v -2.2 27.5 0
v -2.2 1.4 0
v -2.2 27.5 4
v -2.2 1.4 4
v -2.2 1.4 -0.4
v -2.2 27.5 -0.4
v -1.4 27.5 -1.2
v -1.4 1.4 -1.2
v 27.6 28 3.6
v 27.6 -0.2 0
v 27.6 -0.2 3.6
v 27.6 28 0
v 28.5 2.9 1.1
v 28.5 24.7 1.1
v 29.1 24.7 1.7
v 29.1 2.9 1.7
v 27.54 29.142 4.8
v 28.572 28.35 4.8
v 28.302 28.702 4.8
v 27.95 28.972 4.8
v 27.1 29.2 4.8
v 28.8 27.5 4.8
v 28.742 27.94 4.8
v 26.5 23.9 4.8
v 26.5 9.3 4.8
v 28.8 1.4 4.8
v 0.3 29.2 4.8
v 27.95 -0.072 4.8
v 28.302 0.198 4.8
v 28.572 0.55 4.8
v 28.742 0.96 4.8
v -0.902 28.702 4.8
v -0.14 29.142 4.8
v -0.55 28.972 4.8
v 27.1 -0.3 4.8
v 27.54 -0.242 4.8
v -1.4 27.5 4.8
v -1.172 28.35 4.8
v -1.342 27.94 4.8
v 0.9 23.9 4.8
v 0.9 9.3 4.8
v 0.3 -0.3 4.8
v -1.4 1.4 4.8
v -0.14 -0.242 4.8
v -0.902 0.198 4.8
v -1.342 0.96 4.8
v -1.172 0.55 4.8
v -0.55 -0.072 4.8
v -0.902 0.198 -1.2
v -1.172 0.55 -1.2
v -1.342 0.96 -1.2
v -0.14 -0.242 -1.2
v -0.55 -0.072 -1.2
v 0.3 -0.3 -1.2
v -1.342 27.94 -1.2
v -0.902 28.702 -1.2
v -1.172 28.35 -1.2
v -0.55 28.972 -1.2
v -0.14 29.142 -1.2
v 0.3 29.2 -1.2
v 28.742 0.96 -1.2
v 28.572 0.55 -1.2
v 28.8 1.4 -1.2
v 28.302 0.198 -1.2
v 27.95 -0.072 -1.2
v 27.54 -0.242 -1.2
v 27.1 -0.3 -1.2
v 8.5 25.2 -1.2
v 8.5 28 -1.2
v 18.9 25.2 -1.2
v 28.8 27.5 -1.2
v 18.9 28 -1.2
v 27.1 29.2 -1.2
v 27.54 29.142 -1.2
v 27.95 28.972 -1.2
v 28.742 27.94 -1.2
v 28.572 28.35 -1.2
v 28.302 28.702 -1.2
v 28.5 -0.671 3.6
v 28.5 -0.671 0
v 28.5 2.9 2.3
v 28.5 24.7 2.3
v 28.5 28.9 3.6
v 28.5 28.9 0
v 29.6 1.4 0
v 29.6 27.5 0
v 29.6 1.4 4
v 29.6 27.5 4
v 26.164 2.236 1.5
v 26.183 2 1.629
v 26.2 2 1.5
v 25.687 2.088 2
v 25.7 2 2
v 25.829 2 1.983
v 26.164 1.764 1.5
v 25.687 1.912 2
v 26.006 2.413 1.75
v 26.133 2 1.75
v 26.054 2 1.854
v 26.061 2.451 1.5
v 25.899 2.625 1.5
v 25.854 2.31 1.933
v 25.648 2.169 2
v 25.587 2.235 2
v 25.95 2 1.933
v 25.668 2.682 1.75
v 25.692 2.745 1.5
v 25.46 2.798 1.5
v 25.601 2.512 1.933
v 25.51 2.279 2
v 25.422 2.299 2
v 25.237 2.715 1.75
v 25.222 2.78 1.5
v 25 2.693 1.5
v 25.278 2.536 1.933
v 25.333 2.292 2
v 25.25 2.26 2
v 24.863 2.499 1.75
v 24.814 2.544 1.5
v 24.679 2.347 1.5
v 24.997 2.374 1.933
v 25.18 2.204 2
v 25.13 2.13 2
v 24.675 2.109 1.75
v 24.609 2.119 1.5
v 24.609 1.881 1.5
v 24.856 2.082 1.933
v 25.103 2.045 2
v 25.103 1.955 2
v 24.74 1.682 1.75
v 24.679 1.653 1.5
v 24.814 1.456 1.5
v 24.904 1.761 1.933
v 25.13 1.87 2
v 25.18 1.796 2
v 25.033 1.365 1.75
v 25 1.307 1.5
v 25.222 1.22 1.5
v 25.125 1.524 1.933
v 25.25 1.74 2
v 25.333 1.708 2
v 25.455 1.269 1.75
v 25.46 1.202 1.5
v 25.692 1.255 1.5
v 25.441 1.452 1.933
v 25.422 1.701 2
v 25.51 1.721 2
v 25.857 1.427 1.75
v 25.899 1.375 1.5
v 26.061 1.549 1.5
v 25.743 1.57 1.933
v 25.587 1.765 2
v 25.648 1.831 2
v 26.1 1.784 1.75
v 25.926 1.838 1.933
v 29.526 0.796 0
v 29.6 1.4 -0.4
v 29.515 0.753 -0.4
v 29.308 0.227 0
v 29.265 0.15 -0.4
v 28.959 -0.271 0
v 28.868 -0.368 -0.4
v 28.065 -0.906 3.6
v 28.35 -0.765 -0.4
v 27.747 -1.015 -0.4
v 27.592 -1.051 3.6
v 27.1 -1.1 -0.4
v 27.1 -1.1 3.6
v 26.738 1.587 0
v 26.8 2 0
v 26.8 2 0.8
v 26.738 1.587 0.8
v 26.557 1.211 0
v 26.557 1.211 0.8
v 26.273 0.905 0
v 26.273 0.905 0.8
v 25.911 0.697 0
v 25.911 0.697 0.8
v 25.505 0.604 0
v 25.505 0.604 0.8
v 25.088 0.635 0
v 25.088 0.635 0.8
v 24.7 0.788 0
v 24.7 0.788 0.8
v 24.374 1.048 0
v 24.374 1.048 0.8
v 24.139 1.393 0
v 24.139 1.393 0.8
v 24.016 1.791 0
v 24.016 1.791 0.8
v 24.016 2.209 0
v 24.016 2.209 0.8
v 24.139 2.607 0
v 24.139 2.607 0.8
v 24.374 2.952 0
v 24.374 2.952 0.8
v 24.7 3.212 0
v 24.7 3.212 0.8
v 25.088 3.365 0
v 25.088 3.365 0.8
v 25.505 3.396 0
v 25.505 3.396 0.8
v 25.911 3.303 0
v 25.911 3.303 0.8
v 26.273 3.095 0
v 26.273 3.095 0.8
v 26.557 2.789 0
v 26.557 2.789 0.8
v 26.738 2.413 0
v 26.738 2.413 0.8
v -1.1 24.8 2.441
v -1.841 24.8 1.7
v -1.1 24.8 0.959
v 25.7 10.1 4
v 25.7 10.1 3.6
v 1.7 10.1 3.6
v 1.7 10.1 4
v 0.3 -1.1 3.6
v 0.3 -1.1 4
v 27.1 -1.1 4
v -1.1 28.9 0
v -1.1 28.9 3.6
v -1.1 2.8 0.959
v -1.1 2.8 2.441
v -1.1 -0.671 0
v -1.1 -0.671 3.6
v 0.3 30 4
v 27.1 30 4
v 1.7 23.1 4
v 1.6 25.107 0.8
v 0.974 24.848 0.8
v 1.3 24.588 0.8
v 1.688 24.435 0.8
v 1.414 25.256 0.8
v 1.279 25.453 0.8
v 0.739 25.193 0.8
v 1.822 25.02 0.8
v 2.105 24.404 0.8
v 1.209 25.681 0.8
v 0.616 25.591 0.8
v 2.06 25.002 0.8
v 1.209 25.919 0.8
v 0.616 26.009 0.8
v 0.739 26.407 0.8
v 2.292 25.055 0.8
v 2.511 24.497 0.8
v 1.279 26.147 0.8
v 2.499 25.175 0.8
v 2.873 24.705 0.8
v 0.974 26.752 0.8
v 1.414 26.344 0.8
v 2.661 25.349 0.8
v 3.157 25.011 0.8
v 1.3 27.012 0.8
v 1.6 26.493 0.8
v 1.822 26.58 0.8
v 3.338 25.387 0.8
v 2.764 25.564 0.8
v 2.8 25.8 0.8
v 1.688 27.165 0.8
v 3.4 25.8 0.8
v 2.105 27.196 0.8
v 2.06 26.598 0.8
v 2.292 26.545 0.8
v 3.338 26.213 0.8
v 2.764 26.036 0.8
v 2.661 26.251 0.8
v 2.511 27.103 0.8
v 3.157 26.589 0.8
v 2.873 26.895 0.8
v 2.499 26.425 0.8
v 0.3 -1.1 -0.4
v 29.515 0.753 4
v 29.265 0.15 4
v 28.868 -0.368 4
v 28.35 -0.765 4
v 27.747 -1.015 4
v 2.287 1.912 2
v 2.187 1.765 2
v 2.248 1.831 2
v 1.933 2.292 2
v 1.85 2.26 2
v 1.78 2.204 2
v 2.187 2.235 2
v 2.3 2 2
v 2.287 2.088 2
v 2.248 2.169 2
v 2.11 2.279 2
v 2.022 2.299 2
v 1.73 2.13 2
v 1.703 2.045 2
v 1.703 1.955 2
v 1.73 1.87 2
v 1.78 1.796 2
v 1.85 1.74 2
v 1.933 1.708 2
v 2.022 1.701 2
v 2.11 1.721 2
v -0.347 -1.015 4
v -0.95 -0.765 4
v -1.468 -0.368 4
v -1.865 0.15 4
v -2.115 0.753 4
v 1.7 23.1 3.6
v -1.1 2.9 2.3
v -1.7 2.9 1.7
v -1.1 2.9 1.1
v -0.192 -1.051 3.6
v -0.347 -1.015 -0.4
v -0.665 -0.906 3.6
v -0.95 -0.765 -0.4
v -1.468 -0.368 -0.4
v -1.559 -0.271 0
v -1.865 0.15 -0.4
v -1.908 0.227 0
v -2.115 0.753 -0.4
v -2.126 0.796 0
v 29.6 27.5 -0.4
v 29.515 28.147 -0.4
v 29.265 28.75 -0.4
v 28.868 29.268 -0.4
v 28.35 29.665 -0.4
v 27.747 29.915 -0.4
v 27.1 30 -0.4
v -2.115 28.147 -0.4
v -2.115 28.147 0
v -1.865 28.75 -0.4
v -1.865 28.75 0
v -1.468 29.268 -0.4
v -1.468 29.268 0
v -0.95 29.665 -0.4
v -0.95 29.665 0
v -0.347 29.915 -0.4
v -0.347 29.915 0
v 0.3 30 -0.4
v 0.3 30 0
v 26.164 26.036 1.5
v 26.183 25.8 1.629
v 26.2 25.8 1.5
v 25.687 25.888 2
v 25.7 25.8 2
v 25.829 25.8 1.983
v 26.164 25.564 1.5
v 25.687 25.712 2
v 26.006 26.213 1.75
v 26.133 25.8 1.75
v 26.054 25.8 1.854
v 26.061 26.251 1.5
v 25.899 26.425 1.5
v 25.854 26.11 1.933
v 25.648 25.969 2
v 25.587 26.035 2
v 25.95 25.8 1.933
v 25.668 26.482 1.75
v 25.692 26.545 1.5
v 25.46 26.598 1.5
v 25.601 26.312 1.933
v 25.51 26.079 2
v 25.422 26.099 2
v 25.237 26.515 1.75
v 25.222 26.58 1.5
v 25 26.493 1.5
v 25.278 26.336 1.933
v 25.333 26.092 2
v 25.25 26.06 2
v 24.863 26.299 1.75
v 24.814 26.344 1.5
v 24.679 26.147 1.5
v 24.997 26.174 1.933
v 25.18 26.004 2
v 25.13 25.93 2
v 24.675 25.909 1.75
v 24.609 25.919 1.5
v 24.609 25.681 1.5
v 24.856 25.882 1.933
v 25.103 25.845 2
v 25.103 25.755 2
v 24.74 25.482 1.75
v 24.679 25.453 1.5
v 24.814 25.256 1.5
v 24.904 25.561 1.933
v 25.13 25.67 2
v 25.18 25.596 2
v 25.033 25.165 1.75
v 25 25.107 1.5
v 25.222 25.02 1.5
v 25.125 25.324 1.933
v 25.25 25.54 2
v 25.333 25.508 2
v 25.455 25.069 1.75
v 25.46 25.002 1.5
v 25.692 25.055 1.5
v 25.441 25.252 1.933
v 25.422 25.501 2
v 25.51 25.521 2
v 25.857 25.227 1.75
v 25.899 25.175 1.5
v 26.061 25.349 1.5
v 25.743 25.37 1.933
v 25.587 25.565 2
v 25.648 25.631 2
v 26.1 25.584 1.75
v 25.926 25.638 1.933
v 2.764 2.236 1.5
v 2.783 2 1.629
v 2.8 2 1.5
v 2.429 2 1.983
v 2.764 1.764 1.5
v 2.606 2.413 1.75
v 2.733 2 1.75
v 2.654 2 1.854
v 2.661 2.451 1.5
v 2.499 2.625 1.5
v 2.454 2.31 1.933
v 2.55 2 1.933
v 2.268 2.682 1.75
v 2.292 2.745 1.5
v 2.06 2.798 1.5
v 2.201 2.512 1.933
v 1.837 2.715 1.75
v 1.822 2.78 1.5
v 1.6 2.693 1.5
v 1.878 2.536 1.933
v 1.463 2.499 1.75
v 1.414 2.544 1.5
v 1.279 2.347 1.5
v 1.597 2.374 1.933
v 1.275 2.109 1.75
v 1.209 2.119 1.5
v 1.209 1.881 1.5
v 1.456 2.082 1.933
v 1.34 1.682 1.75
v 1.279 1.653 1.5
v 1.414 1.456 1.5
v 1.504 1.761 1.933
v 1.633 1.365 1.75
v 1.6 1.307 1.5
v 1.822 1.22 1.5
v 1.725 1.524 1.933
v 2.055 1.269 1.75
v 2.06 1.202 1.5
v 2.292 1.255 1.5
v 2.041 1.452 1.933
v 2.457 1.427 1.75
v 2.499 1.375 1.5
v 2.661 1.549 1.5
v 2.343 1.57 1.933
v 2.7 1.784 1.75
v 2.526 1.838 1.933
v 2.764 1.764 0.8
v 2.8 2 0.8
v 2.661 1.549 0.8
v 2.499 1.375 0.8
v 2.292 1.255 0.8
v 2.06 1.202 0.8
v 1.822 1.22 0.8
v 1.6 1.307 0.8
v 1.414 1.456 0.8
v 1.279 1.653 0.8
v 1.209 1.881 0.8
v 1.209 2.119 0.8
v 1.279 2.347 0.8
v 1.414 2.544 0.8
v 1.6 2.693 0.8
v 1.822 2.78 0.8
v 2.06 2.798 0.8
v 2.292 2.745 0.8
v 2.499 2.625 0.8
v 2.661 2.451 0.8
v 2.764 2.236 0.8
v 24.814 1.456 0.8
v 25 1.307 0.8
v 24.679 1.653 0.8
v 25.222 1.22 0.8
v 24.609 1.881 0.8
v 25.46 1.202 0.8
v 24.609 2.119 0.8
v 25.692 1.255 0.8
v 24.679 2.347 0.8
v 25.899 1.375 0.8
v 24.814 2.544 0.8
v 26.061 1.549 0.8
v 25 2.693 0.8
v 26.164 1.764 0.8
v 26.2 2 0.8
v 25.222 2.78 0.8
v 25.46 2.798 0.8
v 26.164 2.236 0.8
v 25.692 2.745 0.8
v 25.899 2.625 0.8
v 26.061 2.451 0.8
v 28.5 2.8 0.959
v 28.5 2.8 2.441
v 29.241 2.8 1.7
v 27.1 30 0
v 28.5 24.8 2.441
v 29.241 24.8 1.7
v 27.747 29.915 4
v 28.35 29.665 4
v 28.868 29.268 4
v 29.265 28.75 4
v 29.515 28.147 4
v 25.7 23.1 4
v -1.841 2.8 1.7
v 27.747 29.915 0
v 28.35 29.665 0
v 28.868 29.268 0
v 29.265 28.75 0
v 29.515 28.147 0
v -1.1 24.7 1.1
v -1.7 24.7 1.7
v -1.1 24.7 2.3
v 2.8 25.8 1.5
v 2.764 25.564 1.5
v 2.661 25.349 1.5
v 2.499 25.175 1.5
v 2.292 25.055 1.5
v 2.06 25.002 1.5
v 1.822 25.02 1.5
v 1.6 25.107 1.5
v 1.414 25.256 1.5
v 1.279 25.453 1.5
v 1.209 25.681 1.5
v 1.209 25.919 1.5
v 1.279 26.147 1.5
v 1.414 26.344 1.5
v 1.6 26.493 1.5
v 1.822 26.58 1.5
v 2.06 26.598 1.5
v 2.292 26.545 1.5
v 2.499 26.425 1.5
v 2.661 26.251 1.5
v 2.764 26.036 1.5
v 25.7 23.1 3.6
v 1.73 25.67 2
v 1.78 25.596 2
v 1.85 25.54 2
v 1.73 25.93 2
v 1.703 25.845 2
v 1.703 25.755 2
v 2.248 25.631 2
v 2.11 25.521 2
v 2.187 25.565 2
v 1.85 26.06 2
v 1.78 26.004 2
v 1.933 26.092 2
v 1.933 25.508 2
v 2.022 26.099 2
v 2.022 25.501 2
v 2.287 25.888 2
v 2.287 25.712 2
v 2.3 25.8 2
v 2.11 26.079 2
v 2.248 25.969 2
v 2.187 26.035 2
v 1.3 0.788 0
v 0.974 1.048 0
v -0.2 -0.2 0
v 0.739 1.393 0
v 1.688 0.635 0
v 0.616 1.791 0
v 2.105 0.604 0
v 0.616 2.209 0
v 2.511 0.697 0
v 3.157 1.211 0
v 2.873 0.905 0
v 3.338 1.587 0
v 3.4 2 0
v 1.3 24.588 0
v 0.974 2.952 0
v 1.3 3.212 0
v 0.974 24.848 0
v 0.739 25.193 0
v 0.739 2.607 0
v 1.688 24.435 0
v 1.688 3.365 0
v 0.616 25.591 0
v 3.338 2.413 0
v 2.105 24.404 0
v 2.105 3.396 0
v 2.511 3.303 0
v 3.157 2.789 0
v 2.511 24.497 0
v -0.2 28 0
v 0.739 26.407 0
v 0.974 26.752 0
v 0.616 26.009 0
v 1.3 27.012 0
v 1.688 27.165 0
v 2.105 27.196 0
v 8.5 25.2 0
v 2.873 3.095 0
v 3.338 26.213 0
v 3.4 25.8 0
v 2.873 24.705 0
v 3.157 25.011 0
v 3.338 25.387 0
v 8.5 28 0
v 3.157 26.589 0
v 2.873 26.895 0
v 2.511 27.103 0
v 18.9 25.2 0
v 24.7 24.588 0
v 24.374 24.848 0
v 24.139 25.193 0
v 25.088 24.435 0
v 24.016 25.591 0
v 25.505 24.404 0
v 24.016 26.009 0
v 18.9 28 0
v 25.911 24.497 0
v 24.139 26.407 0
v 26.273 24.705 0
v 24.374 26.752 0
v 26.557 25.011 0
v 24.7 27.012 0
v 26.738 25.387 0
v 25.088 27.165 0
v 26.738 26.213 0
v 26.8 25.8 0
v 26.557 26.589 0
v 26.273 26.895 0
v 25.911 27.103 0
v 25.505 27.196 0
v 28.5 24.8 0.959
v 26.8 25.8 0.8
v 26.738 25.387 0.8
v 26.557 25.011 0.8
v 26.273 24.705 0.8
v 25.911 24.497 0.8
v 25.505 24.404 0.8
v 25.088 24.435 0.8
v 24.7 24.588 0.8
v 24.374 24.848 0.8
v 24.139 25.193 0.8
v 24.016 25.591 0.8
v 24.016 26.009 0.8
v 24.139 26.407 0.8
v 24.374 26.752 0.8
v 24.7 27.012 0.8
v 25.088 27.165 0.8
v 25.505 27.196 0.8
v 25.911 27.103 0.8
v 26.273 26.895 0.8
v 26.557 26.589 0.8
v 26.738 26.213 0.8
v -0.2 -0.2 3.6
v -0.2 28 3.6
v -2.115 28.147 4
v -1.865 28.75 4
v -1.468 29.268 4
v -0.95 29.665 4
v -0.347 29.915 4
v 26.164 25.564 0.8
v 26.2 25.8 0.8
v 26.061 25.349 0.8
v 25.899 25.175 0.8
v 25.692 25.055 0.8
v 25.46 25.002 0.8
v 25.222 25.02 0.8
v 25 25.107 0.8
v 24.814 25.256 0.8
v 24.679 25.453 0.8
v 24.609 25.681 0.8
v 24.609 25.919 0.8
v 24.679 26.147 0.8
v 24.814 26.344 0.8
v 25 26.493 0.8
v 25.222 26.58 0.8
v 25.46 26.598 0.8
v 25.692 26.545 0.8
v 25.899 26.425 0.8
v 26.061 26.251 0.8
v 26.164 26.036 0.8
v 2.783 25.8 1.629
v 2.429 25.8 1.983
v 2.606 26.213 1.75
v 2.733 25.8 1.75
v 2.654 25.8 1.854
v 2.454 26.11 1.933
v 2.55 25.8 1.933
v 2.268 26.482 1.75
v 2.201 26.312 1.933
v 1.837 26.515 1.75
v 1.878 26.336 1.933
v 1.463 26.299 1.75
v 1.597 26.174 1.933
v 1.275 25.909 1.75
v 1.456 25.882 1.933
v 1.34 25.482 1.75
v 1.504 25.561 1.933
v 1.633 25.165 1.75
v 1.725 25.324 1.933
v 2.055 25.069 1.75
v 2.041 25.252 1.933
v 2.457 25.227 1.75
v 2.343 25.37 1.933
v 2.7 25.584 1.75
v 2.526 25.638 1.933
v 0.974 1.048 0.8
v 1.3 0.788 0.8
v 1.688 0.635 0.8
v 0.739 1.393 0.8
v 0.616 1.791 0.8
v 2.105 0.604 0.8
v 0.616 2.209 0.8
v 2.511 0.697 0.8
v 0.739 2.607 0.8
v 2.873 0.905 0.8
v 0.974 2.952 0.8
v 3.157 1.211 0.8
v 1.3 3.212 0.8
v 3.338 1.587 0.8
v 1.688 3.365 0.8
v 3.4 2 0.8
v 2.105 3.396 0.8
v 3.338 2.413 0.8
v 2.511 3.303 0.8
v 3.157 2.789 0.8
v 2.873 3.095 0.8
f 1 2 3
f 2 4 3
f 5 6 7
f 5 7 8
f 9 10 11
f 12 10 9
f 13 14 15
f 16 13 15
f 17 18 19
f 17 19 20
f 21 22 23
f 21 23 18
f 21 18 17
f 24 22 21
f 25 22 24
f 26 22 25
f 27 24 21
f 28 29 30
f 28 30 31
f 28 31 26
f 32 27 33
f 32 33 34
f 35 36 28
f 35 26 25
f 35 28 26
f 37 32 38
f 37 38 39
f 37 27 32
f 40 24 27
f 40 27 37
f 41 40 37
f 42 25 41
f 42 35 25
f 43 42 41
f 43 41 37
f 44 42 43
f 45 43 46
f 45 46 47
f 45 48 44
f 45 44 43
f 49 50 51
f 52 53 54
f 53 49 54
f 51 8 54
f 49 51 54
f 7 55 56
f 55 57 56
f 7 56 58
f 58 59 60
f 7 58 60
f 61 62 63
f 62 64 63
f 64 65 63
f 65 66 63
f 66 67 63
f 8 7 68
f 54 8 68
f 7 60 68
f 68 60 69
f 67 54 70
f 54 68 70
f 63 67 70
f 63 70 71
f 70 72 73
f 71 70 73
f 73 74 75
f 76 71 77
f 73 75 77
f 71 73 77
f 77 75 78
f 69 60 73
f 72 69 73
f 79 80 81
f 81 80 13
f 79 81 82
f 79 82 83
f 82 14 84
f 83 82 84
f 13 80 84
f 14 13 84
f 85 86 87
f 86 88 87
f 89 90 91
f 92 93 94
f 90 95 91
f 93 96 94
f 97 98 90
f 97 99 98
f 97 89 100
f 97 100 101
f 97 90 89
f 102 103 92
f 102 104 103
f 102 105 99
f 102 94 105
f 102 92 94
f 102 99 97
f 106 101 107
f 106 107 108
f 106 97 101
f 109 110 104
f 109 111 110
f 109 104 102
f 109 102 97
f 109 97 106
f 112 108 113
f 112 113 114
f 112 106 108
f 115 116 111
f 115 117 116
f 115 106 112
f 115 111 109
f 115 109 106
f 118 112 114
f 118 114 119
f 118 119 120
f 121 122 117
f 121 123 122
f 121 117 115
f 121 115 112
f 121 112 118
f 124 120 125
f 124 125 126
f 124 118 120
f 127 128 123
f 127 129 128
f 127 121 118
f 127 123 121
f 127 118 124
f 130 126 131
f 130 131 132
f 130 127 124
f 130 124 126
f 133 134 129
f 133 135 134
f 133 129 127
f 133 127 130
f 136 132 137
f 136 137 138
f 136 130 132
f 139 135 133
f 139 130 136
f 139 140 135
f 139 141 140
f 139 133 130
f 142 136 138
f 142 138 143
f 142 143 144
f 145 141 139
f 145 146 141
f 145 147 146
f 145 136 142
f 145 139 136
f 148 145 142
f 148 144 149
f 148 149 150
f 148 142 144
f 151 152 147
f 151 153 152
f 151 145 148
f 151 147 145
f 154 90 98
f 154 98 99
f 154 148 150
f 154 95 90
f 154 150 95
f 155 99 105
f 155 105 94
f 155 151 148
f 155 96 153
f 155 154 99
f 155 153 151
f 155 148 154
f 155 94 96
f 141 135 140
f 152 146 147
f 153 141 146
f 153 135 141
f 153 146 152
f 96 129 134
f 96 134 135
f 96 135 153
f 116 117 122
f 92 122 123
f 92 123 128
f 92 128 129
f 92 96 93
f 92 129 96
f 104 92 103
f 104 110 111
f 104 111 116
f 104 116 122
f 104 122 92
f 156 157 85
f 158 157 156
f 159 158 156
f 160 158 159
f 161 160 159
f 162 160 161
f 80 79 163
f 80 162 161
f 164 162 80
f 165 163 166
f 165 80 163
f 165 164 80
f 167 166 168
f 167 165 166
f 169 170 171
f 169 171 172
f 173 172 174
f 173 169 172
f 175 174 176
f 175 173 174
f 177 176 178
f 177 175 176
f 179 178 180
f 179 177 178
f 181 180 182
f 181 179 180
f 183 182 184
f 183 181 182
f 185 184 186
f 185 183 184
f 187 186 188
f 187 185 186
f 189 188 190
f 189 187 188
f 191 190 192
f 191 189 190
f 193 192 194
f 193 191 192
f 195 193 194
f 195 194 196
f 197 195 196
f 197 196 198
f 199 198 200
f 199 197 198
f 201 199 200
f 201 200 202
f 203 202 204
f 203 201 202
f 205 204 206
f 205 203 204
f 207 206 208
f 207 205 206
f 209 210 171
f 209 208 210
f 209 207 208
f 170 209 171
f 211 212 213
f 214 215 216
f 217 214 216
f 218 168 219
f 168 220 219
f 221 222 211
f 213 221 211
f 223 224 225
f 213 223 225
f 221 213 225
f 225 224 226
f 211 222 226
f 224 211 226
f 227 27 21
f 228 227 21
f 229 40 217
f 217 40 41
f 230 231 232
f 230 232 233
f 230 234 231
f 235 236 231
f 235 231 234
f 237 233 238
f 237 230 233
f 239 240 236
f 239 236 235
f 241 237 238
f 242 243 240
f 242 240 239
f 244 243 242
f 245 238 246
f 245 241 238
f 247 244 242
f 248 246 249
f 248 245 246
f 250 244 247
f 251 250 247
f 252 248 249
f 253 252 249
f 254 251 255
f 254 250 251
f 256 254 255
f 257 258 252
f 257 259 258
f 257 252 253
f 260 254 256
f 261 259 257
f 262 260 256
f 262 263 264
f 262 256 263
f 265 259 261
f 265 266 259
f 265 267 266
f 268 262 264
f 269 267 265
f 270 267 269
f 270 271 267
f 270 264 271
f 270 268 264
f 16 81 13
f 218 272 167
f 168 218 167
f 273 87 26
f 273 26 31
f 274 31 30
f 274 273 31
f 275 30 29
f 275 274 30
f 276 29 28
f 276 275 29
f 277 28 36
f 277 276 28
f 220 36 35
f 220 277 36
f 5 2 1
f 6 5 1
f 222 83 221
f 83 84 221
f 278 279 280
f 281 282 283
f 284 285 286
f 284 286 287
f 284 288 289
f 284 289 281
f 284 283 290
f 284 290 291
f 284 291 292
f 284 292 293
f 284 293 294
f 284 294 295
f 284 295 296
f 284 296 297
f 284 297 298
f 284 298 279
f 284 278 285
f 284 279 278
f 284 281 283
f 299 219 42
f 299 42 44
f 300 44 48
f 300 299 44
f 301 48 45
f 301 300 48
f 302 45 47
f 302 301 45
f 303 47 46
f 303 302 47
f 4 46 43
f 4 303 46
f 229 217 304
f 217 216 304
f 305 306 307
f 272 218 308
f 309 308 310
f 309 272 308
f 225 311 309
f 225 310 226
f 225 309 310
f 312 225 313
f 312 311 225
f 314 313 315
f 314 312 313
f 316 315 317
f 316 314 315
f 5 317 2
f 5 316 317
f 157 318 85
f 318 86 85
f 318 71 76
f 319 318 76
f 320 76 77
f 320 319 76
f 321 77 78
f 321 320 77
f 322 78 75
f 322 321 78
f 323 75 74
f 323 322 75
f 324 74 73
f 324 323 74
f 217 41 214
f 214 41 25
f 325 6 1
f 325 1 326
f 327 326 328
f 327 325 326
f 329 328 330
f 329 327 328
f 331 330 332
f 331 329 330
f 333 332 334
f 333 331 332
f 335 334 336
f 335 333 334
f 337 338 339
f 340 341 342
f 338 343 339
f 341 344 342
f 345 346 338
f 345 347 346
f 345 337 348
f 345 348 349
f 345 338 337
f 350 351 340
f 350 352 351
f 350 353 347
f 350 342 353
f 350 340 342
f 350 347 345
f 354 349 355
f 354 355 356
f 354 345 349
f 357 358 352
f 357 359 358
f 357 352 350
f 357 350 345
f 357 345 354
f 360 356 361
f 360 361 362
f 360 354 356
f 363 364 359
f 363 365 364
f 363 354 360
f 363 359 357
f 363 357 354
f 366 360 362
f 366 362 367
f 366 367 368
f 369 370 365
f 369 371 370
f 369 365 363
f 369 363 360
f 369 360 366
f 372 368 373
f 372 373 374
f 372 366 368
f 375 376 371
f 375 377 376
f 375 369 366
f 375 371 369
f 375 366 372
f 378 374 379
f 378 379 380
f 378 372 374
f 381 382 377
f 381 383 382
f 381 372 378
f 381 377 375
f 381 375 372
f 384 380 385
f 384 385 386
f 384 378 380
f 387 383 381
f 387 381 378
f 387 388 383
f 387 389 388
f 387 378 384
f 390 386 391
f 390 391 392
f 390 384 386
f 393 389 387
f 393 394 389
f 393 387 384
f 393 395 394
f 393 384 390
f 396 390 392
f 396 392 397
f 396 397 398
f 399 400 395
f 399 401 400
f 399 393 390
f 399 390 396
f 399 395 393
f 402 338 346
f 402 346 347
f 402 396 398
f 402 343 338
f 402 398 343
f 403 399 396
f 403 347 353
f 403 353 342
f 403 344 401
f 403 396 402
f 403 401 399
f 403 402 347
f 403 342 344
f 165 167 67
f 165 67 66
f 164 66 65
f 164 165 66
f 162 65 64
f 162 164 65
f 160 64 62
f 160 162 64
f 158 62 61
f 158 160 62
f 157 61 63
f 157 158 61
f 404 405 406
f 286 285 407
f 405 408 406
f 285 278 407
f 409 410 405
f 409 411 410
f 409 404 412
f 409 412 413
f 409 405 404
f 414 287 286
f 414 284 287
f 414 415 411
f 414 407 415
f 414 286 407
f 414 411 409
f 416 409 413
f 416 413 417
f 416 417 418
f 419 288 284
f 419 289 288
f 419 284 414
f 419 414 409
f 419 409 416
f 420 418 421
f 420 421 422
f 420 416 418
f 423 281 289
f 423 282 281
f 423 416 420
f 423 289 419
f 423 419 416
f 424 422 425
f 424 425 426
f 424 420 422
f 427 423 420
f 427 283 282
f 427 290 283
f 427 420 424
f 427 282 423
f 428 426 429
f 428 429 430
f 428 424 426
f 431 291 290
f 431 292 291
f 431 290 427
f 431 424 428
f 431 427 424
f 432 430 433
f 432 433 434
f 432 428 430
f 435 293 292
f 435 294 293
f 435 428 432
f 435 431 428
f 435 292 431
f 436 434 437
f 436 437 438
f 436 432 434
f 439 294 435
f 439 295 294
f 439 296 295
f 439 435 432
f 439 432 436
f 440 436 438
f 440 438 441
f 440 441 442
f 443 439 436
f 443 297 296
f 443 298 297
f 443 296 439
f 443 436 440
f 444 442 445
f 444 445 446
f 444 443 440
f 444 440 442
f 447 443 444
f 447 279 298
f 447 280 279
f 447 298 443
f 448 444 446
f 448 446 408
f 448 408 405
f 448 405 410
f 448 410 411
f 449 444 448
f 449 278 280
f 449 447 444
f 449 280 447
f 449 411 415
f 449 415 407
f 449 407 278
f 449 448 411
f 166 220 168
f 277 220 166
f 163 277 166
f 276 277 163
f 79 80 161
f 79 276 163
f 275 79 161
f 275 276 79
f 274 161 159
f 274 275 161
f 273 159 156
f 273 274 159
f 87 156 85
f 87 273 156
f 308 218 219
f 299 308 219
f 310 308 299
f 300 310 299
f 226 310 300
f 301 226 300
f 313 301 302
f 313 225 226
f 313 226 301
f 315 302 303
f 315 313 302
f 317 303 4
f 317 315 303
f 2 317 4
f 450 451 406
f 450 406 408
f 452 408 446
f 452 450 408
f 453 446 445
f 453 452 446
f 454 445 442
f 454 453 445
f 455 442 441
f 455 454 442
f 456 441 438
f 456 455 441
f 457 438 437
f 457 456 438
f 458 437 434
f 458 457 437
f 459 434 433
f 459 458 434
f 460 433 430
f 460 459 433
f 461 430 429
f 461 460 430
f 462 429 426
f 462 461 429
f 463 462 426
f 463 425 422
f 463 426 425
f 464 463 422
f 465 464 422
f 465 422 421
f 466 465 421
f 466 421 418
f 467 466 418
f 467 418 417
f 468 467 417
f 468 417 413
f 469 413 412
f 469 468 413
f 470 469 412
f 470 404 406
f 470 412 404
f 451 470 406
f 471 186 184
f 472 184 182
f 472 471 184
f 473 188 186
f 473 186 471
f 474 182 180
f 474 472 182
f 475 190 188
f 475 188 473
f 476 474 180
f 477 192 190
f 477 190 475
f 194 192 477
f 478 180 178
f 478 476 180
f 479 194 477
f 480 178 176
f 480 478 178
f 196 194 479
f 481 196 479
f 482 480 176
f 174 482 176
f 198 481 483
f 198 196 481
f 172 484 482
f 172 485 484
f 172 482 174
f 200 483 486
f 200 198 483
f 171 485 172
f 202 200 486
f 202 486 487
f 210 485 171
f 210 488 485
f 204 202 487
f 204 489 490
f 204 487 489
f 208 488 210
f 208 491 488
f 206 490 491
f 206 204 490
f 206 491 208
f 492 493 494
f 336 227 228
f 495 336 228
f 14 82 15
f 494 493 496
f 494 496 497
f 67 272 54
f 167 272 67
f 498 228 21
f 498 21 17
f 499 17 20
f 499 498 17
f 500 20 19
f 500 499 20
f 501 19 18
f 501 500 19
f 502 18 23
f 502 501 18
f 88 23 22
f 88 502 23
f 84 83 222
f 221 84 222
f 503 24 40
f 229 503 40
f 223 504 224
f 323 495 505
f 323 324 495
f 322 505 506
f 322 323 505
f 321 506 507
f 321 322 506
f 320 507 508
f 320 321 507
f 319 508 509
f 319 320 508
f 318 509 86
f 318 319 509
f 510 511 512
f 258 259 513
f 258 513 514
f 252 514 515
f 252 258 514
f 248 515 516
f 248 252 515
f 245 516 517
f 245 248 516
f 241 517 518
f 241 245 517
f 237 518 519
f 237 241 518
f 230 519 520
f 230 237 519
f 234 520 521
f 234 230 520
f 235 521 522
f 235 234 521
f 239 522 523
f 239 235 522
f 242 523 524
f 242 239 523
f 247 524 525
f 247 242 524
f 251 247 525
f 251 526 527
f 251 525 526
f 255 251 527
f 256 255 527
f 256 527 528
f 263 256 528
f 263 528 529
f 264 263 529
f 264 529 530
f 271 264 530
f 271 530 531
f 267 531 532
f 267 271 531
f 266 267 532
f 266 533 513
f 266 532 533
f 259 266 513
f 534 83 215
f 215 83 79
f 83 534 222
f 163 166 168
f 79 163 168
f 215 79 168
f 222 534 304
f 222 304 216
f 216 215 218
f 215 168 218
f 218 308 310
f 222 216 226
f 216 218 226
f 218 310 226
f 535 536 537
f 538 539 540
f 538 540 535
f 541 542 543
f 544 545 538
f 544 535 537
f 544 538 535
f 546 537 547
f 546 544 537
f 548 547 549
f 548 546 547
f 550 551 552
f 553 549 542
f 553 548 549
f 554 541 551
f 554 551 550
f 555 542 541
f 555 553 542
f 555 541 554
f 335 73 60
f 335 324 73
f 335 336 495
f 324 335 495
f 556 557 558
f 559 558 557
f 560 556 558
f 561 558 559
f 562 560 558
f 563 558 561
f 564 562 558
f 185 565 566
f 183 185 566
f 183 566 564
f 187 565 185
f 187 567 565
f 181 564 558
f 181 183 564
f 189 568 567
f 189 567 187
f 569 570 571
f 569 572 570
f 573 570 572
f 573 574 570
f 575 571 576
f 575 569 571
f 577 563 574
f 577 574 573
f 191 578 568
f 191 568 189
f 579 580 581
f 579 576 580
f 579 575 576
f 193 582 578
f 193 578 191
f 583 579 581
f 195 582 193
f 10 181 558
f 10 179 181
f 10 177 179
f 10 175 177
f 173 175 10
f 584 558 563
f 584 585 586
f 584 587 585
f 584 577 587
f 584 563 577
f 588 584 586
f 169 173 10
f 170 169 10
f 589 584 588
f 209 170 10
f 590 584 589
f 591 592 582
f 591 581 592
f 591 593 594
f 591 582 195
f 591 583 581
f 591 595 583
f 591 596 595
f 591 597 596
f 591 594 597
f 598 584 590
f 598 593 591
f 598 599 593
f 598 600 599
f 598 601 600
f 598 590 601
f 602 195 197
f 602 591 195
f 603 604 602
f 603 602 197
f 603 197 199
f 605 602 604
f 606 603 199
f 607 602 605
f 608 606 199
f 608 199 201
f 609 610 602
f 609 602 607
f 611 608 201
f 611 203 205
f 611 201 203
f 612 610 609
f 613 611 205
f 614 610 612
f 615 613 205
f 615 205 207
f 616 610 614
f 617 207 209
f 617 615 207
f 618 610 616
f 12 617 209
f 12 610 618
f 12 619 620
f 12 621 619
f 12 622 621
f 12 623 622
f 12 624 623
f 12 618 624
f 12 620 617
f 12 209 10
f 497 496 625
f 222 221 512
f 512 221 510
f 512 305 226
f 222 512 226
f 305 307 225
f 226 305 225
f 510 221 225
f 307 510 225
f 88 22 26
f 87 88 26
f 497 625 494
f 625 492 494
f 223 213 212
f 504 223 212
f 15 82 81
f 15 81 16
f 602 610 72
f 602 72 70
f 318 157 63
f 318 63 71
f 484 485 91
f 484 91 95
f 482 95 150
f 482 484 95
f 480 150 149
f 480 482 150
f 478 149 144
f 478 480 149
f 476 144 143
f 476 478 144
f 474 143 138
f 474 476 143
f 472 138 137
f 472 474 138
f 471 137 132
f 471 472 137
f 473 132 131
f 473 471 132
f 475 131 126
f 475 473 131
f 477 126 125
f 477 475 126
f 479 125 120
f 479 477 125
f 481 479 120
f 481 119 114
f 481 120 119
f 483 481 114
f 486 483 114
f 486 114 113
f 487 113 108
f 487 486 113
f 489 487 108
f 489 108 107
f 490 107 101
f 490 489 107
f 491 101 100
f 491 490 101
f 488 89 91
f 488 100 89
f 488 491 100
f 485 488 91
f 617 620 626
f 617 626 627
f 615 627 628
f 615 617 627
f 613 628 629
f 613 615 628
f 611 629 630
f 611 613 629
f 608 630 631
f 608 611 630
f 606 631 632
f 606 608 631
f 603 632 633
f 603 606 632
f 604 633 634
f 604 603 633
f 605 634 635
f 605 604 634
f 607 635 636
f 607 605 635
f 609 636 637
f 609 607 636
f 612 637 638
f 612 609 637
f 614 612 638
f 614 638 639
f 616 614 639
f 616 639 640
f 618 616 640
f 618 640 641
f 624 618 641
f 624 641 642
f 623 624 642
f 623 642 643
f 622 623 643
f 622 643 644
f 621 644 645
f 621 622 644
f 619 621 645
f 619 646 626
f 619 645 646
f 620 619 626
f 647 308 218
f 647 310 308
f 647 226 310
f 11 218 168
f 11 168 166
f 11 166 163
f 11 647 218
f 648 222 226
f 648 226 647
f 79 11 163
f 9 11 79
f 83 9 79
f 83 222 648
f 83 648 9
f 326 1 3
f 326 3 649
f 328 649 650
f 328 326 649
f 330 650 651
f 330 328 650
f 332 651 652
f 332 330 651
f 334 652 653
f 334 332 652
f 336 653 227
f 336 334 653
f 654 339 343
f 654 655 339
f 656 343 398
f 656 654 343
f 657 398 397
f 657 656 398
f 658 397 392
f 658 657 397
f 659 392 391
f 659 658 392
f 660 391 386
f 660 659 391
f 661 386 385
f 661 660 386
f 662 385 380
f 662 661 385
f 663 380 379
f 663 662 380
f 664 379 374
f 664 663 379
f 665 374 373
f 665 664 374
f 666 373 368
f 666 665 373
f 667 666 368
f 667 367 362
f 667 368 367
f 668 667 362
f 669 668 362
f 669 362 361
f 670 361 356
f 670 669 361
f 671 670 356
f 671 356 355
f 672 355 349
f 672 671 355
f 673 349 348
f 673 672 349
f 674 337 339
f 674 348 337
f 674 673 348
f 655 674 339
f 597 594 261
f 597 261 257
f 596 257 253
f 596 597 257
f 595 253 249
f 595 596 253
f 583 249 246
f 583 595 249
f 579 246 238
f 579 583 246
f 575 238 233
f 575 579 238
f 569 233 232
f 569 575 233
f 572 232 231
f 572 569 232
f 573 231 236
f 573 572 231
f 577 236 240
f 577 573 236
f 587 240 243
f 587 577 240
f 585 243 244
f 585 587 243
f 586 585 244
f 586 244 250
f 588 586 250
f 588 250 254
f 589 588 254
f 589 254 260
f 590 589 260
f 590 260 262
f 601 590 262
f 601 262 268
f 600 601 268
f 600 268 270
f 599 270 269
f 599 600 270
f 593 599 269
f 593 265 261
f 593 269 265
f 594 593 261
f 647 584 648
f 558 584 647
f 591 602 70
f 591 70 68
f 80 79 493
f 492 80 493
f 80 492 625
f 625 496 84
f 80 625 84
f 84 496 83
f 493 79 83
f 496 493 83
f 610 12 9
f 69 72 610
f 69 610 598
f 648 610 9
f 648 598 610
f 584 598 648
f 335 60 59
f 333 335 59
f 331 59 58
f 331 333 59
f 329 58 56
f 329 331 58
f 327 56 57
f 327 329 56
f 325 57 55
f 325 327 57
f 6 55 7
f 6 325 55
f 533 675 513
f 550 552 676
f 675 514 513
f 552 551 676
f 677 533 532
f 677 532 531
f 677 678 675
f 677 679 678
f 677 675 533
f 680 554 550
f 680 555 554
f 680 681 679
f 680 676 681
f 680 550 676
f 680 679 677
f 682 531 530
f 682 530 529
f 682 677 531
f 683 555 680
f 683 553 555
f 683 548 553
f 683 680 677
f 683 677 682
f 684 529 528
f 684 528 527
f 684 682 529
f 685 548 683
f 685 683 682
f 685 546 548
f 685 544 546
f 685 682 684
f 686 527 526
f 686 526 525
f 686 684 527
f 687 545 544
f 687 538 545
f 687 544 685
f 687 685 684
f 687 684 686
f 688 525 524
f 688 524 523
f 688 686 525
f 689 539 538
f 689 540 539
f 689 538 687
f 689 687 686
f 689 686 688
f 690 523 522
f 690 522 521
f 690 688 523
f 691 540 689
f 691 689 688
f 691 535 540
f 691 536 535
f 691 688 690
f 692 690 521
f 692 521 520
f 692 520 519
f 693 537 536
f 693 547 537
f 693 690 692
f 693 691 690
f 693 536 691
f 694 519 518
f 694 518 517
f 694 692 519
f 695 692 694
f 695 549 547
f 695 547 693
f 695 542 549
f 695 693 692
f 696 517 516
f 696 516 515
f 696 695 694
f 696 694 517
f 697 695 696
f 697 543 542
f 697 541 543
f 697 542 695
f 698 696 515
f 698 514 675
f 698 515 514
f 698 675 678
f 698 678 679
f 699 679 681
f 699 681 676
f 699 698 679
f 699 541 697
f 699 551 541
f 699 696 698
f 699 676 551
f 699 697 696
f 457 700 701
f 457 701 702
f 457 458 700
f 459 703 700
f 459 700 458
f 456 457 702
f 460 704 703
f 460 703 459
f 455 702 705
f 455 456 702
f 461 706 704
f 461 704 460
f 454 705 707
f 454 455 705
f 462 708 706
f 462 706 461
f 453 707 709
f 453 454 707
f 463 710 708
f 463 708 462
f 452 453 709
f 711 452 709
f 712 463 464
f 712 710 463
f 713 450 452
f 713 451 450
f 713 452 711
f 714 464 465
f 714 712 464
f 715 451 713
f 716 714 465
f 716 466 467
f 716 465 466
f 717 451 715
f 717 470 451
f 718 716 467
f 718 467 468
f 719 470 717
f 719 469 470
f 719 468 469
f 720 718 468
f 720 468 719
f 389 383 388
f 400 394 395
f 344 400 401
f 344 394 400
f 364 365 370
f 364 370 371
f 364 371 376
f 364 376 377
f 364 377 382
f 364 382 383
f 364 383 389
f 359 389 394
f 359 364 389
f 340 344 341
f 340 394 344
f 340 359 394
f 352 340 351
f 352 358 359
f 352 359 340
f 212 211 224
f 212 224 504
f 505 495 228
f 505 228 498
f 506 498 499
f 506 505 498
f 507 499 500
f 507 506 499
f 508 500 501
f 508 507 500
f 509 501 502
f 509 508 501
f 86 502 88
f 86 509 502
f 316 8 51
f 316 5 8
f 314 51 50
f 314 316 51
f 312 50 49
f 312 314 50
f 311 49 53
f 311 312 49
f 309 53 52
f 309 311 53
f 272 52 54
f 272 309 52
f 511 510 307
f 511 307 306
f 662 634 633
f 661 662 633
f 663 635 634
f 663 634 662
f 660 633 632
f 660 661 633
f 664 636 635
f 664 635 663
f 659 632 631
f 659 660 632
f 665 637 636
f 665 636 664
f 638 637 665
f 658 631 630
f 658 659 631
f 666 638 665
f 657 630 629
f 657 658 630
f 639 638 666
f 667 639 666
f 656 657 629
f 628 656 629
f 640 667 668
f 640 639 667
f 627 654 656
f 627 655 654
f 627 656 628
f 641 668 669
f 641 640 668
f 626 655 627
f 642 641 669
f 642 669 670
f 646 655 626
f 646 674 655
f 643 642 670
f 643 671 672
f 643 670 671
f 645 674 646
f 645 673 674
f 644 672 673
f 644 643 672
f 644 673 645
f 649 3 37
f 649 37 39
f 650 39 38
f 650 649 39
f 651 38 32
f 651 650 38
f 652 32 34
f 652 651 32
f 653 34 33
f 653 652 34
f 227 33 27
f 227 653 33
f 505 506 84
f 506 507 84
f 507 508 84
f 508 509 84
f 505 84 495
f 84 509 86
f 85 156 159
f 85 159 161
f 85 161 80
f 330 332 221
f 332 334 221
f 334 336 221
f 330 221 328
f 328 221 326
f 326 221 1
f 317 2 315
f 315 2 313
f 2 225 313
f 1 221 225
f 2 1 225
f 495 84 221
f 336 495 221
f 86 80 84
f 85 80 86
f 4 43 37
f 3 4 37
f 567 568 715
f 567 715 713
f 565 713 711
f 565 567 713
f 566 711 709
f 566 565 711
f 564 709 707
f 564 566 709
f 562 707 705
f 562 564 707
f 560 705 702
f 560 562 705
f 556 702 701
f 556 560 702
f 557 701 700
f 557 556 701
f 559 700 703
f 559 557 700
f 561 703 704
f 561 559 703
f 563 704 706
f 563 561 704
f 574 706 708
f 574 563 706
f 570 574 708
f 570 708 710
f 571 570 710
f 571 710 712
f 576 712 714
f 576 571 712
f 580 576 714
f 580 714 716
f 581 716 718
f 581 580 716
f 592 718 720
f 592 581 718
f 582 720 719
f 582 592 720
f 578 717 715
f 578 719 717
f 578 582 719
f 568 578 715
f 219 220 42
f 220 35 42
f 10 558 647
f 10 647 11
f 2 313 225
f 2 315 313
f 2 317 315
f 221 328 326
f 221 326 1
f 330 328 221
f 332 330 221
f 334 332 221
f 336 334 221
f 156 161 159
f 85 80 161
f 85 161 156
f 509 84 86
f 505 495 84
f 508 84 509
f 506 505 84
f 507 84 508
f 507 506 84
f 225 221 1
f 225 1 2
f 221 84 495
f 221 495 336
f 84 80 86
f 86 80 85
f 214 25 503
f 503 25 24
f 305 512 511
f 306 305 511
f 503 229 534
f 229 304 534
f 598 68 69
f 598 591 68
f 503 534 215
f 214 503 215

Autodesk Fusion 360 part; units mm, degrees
sketch "Screen PCB" plane through (0, 0, 0) normal (0, 0, 1) x (1, 0, 0)
  line L0 (0, 0) -> (27.4, 0)
  line L1 (27.4, 0) -> (27.4, 27.8)
  line L2 (27.4, 27.8) -> (0, 27.8)
  line L3 (0, 27.8) -> (0, 0)
  line L4 (8.7, 27.8) -> (18.7, 27.8)
  line L5 (18.7, 27.8) -> (18.7, 25.4)
  line L6 (18.7, 25.4) -> (8.7, 25.4)
  line L7 (8.7, 25.4) -> (8.7, 27.8)
  line L8 (1.4, 23.3) -> (26, 23.3)
  line L9 (26, 23.3) -> (26, 6.9)
  line L10 (26, 6.9) -> (1.4, 6.9)
  line L11 (1.4, 6.9) -> (1.4, 23.3)
  line L12 (13.7, 6.9) -> (13.7, 0) construction
  circle A0 centre (2, 2) radius 1
  circle A1 centre (25.4, 2) radius 1
  circle A2 centre (2, 25.8) radius 1
  circle A3 centre (25.4, 25.8) radius 1
  point P0 (13.7, 6.9)
  point P1 (13.7, 0)
  dimension "d1" = 27.4
  dimension "d2" = 27.8
  dimension "d14" = 10
  dimension "d15" = 2.4
  dimension "d16" = 24.6
  dimension "d17" = 16.4
  dimension "d18" = 4.5
  dimension "d19" = 1.4
  dimension "d20" = 6.9
  dimension "d21" = 2
  dimension "d22" = 2
  dimension "d23" = 2
  dimension "d26" = 23.4
  dimension "d27" = 23.8
sketch "Case Base" plane through (0, 0, 0) normal (0, 0, 1) x (1, 0, 0)
  line L0 (27.4, 27.8) -> (0, 27.8)
  line L1 (27.4, 0) -> (27.4, 27.8)
  line L2 (0, 27.8) -> (0, 0)
  line L3 (0, 0) -> (27.4, 0)
  line L4 (-0.2, -0.2) -> (27.6, -0.2)
  line L5 (27.6, -0.2) -> (27.6, 28)
  line L6 (27.6, 28) -> (-0.2, 28)
  line L7 (-0.2, 28) -> (-0.2, -0.2)
  circle A0 centre (2, 25.8) radius 1
  circle A1 centre (25.4, 25.8) radius 1
  circle A2 centre (25.4, 2) radius 1
  circle A3 centre (2, 2) radius 1
  circle A4 centre (2, 25.8) radius 0.8
  circle A5 centre (25.4, 25.8) radius 0.8
  circle A6 centre (25.4, 2) radius 0.8
  circle A7 centre (2, 2) radius 0.8
  line L8 (28.5, 28.9) -> (-1.1, 28.9)
  line L9 (-1.1, 28.9) -> (-1.1, -1.1)
  line L10 (-1.1, -1.1) -> (28.5, -1.1)
  line L11 (28.5, -1.1) -> (28.5, 28.9)
  circle A8 centre (2, 25.8) radius 1.4
  circle A9 centre (25.4, 25.8) radius 1.4
  circle A10 centre (25.4, 2) radius 1.4
  circle A11 centre (2, 2) radius 1.4
  line L12 (18.7, 27.8) -> (18.7, 25.4)
  line L13 (18.7, 25.4) -> (8.7, 25.4)
  line L14 (8.7, 25.4) -> (8.7, 27.8)
  line L15 (8.7, 27.8) -> (18.7, 27.8)
  line L16 (8.5, 28) -> (18.9, 28)
  line L17 (18.9, 28) -> (18.9, 25.2)
  line L18 (18.9, 25.2) -> (8.5, 25.2)
  line L19 (8.5, 25.2) -> (8.5, 28)
  line L20 (-2.2, 30) -> (29.6, 30)
  line L21 (29.6, 30) -> (29.6, -1.1)
  line L22 (29.6, -1.1) -> (-2.2, -1.1)
  line L23 (-2.2, -1.1) -> (-2.2, 30)
  point P0 (2, 25.8)
  dimension "d28" = 0.2
  dimension "d33" = 1.1
  dimension "d37" = 0.4
  dimension "d38" = 0.4
  dimension "d39" = 0.4
  dimension "d40" = 0.4
  dimension "d53" = 1.1
  dimension "d54" = 1.1
extrude "Extrude3" add sketch "Case Base" against normal blind 1.2 contours L0 L1 L2 L3 L4 L5 L6 L7 L17 L19 | L0 L1 L2 L3 L17 L18 L19 | A0 | A1 | A2 | A3 | A4 | A5 | A6 | A7 | L8 L9 L10 L11 L22 | L8 L9 L11 L20 L21 L22 L23 | A8 | A9 | A10 | A11 makes body 1
extrude "Extrude1" add sketch "Case Base" along normal blind 0.8 contours A0 | A1 | A2 | A3 | A8 | A9 | A10 | A11 bodies 1
extrude "Extrude2" add sketch "Case Base" along normal blind 2 contours A4 | A5 | A6 | A7 bodies 1
extrude "Extrude4" add sketch "Case Base" along normal blind 3.6 contours L8 L9 L10 L11 L22 bodies 1
fillet "Fillet1" radius 0.5 4 faces at (1.8444, 25.6186, 2) (25.5333, 26.1881, 2) (2.4109, 1.7341, 2) (25.6548, 1.9214, 2) on bodies 1
copy_body "Body->Comp1" bodies 1 removing the originals makes body 2 in component "Base"
sketch "Sketch3" plane through (0, -1.1, 0) normal (0, -1, 0) x (1, 0, 0)
  line L0 (28.5, 3.6) -> (-1.1, 3.6)
  line L1 (29.6, 0) -> (28.5, 0)
  line L2 (28.5, 0) -> (28.5, 3.6)
  line L3 (-1.1, 3.6) -> (-1.1, 0)
  line L4 (-1.1, 0) -> (-2.2, 0)
  line L5 (-2.2, 0) -> (-2.2, -1.2)
  line L6 (-2.2, -1.2) -> (29.6, -1.2)
  line L7 (29.6, -1.2) -> (29.6, 0)
  line L8 (-1.1, 1.7) -> (-1.7, 1.7) construction
  line L9 (-1.1, 1.7) -> (-1.1, 2.3)
  line L10 (-1.1, 2.3) -> (-1.7, 1.7)
  line L11 (-1.1, 1.7) -> (-1.1, 1.1)
  line L12 (-1.1, 1.1) -> (-1.7, 1.7)
  line L13 (13.7, 3.6) -> (13.7, -1.2) construction
  line L14 (28.5, 1.7) -> (28.5, 2.3)
  line L15 (28.5, 1.7) -> (28.5, 1.1)
  line L16 (28.5, 2.3) -> (29.1, 1.7)
  line L17 (28.5, 1.7) -> (29.1, 1.7) construction
  line L18 (28.5, 1.1) -> (29.1, 1.7)
  dimension "d58" = 0.6
  dimension "d59" = 0.6
  dimension "d60" = 0.6
fillet "Fillet1'" radius 2.5 4 edges at (-2.2, -1.1, -0.6) (29.6, -1.1, -0.6) (29.6, 30, -0.6) (-2.2, 30, -0.6) on bodies 2 in component "Base"
chamfer "Chamfer1" distance 0.8 angle 45 8 edges at (13.7, -1.1, -1.2) (-1.4678, -0.3678, -1.2) (-2.2, 14.45, -1.2) (-1.4678, 29.2678, -1.2) (13.7, 30, -1.2) (28.8678, 29.2678, -1.2) (29.6, 14.45, -1.2) (28.8678, -0.3678, -1.2) on bodies 2 in component "Base"
extrude "Extrude1'" add sketch "Sketch3" along normal blind -25.8 and the other way blind 4 contours L2 L14 L15 L16 L18 | L3 L9 L10 L11 L12 bodies 2 in component "Base"
sketch "Sketch1" plane through (0, 0, 3.6) normal (0, 0, 1) x (-1, 0, 0) in component "Lid"
  line L0 (0.2, 0.2) -> (0.2, -28)
  line L1 (0.2, -28) -> (-27.6, -28)
  line L2 (-27.6, -28) -> (-27.6, 0.2)
  line L3 (-27.6, 0.2) -> (0.2, 0.2)
  arc A0 (-27.1, 1.1) -> (-28.5, 0.6712) centre (-27.1, -1.4) ccw
  line L4 (-28.5, 0.6712) -> (-28.5, -28.9)
  line L5 (-28.5, -28.9) -> (1.1, -28.9)
  line L6 (1.1, -28.9) -> (1.1, 0.6712)
  arc A1 (1.1, 0.6712) -> (-0.3, 1.1) centre (-0.3, -1.4) ccw
  line L7 (-0.3, 1.1) -> (-27.1, 1.1)
  line L8 (-29.6, 1.1) -> (2.2, 1.1)
  line L9 (2.2, 1.1) -> (2.2, -30)
  line L10 (2.2, -30) -> (-29.6, -30)
  line L11 (-29.6, -30) -> (-29.6, 1.1)
  line L12 (1.1, -28.9) -> (1.1, 1.1)
  line L13 (-28.5, -28.9) -> (1.1, -28.9)
  line L14 (-28.5, 1.1) -> (-28.5, -28.9)
  line L15 (2.2, -30) -> (-29.6, -30)
  line L16 (-29.6, -30) -> (-29.6, 1.1)
  line L17 (-29.6, 1.1) -> (2.2, 1.1)
  line L18 (2.2, 1.1) -> (2.2, -30)
  line L19 (-26, -6.9) -> (-1.4, -6.9)
  line L20 (-1.4, -6.9) -> (-1.4, -23.3)
  line L21 (-1.4, -23.3) -> (-26, -23.3)
  line L22 (-26, -23.3) -> (-26, -6.9)
  line L23 (-1.7, -23.1) -> (-25.7, -23.1)
  line L24 (-25.7, -23.1) -> (-25.7, -10.1)
  line L25 (-25.7, -10.1) -> (-1.7, -10.1)
  line L26 (-1.7, -10.1) -> (-1.7, -23.1)
  line L27 (-13.7, -23.3) -> (-13.7, -23.1) construction
  point P0 (-13.7, -23.1)
  point P1 (-13.7, -23.3)
  dimension "d65" = 24
  dimension "d66" = 13
  dimension "d67" = 0.2
extrude "Extrude1''" add sketch "Sketch1" against normal blind 3.6 separate body contours L4 L5 L6 L8 L9 L10 L11 L12 L13 L14 L15 L16 L17 L18 makes body 3 in component "Lid"
extrude "Extrude2'" add sketch "Sketch1" along normal blind 1.2 contours L0 L1 L2 L3 | A0 L4 L5 L6 A1 L7 L8 L12 L13 L14 L17 | A0 L8 L14 L17 | L4 L5 L6 L8 L9 L10 L11 L12 L13 L14 L15 L16 L17 L18 | A1 L8 L12 L17 | L19 L20 L21 L22 bodies 3 in component "Lid"
extrude "Extrude3'" cut sketch "Sketch3" along normal blind -25.8 and the other way blind 4 contours L2 L14 L15 L16 L18 | L3 L9 L10 L11 L12 bodies 3 in component "Lid"
fillet "Fillet1''" radius 2.5 4 edges at (29.6, -1.1, 2.4) (-2.2, -1.1, 2.4) (29.6, 30, 2.4) (-2.2, 30, 2.4) on bodies 3 in component "Lid"
chamfer "Chamfer1'" distance 0.8 angle 45 1 faces at (17.7, 2.6333, 4.8) on bodies 3 in component "Lid"
move_face "OffsetFaces1" offset -0.1 4 faces at (-1.3, 10.1667, 2.1) (-1.3, 10.1667, 1.3) (-1.3, 2.9, 1.7) (-1.3, 24.7, 1.7) on bodies 3 in component "Lid"
move_face "OffsetFaces2" offset -0.1 4 faces at (28.7, 24.7, 1.7) (28.7, 10.1667, 1.3) (28.7, 10.1667, 2.1) (28.7, 2.9, 1.7) on bodies 3 in component "Lid"
component "Base" placed x (1, 0, 0) y (0, 1, 0) z (0, 0, 1) at (0, 0, 0)
component "Lid" placed x (1, 0, 0) y (0, 1, 0) z (0, 0, 1) at (0, 0, 0)
equation "d1 = board_width"
equation "d2 = board_height"
equation "board_width = 27.4 mm"
equation "board_height = 27.8 mm"
equation "tollerance = 0.2 mm"
equation "board_depth = 1.2 mm"
equation "hole_diameter = 2.0 mm"
equation "hole_to_edge = 1.0 mm"
equation "screen_width = 24.6 mm"
equation "screen_height = 16.4 mm"
equation "screen_and_board_depth = 2.8 mm"
equation "pins_width = 10.0 mm"
equation "pins_height = 2.4 mm"
equation "d14 = pins_width"
equation "d15 = pins_height"
equation "d16 = screen_width"
equation "d17 = screen_height"
equation "d21 = hole_diameter"
equation "d22 = hole_to_edge + ( hole_diameter / 2 )"
equation "d23 = hole_to_edge + ( hole_diameter / 2 )"
equation "d26 = board_width - hole_diameter - ( 2 * hole_to_edge )"
equation "d27 = board_height - hole_diameter - ( 2 * hole_to_edge )"
equation "d28 = tollerance"
equation "d29 = -tollerance"
equation "d30 = -tollerance"
equation "d31 = -tollerance"
equation "d32 = -tollerance"
equation "d33 = inner_wall_width + tollerance"
equation "inner_wall_width = 0.9 mm"
equation "outer_wall_width = 1.1 mm"
equation "base_thickness = 1.2 mm"
equation "d41 = -tollerance"
equation "riser = 0.8 mm"
equation "d43 = riser"
equation "d45 = riser + board_depth"
equation "d47 = -base_thickness"
equation "d49 = riser + screen_and_board_depth"
equation "d52 = hole_diameter / 4"
equation "d53 = outer_wall_width"
equation "d54 = outer_wall_width"
equation "d61 = -( board_height - inner_wall_width - outer_wall_width )"
equation "d63 = ( inner_wall_width + outer_wall_width ) * 2"
equation "d68 = -( screen_and_board_depth + riser )"
equation "d70 = board_depth"
equation "d72 = -( board_height - inner_wall_width - outer_wall_width )"
equation "d74 = ( inner_wall_width + outer_wall_width ) * 2"
equation "d79 = -tollerance / 2"
equation "d80 = -tollerance / 2"
